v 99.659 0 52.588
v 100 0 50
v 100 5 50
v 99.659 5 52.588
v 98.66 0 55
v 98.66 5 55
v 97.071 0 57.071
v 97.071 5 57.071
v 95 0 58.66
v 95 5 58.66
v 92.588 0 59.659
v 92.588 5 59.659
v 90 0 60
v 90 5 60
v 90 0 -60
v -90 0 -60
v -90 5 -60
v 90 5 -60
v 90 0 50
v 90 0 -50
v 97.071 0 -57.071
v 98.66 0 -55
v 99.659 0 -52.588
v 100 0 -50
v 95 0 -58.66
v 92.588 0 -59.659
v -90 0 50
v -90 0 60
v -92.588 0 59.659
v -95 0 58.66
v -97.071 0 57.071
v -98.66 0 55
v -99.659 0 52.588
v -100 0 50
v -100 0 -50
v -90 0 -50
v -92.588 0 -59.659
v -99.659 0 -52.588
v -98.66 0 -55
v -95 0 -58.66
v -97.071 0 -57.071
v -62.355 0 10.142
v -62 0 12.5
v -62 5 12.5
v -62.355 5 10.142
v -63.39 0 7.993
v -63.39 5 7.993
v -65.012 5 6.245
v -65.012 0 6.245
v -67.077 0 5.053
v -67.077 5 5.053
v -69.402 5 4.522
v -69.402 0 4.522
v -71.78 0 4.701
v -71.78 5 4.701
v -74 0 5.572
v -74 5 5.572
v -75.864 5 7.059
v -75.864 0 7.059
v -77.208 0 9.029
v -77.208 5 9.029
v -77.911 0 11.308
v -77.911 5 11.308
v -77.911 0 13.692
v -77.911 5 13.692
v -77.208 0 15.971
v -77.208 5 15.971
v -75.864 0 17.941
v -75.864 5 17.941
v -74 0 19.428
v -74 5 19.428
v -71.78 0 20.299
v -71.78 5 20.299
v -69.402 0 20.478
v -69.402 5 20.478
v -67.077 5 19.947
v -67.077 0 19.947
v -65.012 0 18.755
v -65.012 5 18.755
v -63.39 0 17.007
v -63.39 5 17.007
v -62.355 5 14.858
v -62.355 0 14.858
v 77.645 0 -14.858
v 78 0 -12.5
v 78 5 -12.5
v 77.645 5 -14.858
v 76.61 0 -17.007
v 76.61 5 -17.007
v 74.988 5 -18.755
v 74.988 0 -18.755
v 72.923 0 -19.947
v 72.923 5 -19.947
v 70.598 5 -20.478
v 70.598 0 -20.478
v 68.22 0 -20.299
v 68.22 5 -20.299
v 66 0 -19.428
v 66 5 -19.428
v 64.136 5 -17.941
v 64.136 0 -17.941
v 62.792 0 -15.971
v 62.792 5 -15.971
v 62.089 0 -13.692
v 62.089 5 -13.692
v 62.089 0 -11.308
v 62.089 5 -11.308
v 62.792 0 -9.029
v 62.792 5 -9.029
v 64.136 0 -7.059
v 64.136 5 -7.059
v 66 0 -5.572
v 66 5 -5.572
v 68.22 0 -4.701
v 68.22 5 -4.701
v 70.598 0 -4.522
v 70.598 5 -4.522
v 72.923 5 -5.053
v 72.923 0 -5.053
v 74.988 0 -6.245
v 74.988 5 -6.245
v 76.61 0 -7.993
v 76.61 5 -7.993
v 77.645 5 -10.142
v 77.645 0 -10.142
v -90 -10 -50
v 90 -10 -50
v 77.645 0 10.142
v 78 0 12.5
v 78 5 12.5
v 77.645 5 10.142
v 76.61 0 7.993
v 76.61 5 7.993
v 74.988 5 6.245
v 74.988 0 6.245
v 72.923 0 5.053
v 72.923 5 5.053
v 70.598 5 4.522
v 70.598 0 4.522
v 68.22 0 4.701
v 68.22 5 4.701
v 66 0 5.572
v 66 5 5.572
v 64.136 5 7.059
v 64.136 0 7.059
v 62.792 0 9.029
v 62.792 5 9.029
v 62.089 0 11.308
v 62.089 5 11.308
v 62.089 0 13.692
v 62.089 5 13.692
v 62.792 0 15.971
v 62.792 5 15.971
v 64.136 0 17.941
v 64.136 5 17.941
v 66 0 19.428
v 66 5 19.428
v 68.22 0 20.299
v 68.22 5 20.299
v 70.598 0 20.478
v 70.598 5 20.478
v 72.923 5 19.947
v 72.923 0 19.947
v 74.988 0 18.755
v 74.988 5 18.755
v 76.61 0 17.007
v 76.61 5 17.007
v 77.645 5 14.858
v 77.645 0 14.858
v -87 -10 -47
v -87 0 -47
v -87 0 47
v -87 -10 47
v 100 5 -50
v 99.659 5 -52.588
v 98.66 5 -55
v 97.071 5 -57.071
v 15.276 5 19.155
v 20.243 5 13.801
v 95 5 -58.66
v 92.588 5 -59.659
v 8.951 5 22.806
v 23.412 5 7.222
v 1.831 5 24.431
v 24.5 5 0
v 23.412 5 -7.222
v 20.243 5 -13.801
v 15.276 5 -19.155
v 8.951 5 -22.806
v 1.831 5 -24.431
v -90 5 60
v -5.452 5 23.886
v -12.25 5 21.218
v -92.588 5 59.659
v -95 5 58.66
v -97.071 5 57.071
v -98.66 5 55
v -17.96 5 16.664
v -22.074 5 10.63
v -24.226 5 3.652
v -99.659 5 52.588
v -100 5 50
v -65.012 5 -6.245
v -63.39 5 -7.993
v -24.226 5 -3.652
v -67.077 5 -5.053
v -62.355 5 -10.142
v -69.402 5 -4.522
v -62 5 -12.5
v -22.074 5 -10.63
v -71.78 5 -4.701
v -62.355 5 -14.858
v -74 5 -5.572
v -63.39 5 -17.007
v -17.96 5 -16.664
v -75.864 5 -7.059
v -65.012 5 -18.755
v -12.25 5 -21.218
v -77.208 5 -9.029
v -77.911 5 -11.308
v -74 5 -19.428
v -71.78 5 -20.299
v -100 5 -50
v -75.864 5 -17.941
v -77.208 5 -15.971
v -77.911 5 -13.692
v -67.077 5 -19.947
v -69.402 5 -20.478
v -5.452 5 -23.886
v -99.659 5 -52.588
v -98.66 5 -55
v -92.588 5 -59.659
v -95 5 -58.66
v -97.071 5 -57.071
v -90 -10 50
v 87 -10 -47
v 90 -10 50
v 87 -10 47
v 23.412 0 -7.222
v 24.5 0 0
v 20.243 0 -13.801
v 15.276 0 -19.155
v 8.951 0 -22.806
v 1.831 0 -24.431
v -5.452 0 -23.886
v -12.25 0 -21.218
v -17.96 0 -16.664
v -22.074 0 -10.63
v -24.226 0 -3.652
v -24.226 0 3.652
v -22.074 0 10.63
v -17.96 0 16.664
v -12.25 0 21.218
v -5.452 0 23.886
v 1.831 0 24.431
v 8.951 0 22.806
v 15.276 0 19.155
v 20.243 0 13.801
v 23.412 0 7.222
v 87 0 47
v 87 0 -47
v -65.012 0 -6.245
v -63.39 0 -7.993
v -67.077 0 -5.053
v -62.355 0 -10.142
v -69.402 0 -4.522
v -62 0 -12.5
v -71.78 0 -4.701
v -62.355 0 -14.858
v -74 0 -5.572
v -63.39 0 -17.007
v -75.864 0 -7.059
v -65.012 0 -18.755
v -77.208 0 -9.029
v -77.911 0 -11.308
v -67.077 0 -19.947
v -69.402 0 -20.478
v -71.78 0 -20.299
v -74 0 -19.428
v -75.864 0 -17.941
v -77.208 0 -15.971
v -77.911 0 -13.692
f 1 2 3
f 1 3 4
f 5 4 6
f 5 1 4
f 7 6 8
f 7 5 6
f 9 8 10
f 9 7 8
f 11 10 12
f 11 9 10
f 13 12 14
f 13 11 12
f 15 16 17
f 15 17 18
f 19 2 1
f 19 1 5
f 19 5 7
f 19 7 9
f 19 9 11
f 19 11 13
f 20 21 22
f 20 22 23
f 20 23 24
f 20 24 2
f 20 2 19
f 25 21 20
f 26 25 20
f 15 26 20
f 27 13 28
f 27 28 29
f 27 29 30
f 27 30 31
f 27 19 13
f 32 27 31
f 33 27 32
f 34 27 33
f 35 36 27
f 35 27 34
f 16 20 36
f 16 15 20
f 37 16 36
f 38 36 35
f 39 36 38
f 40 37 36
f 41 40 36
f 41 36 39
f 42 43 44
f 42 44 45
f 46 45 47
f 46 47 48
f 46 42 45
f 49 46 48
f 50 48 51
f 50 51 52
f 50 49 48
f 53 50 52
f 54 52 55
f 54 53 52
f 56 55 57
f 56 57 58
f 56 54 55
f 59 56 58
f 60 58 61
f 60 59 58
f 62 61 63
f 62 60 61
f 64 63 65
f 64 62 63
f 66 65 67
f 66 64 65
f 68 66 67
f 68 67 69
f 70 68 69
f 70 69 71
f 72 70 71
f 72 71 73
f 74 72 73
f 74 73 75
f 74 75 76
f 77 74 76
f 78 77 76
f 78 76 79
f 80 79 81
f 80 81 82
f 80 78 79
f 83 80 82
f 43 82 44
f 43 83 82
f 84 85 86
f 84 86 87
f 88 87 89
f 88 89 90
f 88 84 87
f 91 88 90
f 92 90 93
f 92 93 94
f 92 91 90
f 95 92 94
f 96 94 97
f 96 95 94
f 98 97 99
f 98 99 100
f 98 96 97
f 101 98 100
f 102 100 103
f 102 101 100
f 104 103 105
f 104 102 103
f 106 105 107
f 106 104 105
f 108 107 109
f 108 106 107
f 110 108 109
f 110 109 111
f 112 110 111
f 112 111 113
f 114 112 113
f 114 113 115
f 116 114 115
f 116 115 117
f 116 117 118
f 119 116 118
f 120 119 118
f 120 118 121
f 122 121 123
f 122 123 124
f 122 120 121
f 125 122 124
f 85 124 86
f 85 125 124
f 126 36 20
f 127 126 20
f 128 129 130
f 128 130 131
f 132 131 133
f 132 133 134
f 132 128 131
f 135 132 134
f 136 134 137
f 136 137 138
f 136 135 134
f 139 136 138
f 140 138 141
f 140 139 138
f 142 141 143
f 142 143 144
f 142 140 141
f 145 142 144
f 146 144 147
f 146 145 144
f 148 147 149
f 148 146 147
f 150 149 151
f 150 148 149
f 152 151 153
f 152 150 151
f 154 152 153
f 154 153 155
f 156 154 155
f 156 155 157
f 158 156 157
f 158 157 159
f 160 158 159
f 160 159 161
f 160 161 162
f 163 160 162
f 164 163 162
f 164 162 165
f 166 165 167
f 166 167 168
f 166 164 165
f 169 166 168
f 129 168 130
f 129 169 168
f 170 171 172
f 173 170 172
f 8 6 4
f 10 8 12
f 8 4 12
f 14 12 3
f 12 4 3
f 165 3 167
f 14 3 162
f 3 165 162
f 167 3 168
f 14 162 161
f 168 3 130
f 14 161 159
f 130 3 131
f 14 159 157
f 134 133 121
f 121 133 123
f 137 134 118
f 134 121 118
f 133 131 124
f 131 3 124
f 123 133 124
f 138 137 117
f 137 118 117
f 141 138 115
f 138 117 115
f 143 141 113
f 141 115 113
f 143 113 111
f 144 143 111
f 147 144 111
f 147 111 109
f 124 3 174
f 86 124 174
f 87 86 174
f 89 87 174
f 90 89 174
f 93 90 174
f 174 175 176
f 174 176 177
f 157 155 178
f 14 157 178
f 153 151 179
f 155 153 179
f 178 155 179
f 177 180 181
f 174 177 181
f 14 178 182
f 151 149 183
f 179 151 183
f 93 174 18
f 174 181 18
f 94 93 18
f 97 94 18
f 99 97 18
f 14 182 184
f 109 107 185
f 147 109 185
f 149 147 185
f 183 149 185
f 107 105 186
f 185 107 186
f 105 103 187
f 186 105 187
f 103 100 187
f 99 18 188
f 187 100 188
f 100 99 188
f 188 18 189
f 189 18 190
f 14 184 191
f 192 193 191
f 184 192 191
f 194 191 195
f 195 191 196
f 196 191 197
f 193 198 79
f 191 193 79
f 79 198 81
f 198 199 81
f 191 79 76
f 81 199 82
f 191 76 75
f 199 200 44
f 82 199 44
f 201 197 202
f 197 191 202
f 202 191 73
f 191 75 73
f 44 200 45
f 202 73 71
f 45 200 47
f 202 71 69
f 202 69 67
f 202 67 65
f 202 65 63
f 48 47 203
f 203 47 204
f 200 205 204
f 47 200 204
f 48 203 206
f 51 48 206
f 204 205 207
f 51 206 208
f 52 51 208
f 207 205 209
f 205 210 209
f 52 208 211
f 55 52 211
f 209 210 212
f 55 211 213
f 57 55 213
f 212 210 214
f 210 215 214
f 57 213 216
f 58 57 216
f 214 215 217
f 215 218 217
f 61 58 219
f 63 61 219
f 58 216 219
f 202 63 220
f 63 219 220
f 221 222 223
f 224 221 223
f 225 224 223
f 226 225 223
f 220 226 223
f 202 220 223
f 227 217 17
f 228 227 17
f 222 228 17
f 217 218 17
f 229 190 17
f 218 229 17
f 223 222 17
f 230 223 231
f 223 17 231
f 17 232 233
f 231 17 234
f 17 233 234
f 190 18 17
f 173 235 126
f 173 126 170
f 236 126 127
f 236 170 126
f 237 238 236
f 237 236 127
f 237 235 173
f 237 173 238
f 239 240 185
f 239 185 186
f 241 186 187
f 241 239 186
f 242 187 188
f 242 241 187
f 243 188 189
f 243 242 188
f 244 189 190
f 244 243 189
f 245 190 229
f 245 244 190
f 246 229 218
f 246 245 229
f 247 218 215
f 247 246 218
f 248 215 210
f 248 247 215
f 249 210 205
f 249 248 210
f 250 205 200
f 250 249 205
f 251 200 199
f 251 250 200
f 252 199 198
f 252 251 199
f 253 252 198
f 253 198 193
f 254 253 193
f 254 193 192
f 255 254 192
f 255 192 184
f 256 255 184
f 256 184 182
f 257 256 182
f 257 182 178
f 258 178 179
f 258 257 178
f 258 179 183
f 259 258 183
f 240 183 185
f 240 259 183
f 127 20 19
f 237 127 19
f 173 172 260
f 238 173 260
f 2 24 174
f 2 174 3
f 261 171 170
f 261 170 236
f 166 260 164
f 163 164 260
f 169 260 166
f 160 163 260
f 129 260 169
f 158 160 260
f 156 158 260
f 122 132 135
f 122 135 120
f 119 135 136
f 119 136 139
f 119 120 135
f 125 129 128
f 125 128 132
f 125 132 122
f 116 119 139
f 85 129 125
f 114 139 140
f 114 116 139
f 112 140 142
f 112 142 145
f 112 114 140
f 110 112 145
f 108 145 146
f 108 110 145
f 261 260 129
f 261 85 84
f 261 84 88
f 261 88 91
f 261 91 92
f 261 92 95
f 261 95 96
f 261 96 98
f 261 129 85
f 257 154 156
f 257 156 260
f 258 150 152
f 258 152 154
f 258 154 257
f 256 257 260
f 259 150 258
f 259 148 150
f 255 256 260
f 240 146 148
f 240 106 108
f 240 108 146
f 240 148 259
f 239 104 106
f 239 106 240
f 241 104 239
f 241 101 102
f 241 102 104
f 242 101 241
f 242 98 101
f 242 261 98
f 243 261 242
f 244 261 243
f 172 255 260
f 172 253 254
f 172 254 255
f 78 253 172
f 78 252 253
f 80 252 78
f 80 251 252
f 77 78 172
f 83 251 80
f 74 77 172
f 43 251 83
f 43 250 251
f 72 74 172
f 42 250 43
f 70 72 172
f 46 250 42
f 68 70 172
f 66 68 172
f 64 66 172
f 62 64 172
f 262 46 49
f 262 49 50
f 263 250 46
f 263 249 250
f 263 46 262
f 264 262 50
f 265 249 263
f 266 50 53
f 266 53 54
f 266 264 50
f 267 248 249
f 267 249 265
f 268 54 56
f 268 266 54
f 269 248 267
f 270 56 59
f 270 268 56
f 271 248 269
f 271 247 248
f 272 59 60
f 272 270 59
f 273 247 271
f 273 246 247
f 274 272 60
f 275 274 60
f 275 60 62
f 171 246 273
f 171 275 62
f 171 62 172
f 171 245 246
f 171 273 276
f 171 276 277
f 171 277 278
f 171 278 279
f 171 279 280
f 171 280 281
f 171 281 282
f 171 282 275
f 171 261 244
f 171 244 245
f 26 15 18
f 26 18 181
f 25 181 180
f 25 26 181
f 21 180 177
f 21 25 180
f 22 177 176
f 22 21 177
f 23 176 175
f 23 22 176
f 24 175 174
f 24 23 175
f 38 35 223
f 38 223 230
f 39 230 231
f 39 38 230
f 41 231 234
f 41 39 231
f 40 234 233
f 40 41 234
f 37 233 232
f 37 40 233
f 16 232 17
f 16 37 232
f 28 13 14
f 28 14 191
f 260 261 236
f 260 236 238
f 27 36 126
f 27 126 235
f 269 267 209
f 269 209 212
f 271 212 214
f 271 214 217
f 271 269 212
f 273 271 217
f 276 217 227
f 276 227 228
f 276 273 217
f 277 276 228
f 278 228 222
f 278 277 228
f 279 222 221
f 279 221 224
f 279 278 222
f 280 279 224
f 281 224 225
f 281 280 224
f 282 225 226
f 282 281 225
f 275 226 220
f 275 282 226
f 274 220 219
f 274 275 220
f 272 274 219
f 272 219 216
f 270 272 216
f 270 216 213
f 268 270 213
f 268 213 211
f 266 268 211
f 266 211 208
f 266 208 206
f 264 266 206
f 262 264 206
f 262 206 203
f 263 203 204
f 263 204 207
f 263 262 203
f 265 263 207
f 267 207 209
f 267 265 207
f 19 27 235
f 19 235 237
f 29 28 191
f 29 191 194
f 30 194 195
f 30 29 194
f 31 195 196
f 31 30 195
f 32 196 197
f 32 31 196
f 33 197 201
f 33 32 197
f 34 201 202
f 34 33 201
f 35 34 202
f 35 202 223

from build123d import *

# Parameters (mm, degrees)
SKETCH1_R           = 24.5
SKETCH1_R_2         = 8
BOSS_EXTRUDE1_DEPTH = 5
SKETCH2_W           = 180
SKETCH2_H           = 100
SKETCH2_W_2         = 174
SKETCH2_H_2         = 94
BOSS_EXTRUDE2_DEPTH = 10


with BuildPart() as part:
    # Sketch1 → Boss-Extrude1 (new body)
    with BuildSketch(Plane(origin=(0, 0, 0), x_dir=(1, 0, 0), z_dir=(0, 1, 0))):
        with BuildLine():
            Line((-90, 60), (90, 60))
            ThreePointArc((90, 60), (97.071067812, 57.071067812), (100, 50))
            Line((100, 50), (100, -50))
            ThreePointArc((100, -50), (97.071067812, -57.071067812), (90, -60))
            Line((90, -60), (-90, -60))
            ThreePointArc((-90, -60), (-97.071067812, -57.071067812), (-100, -50))
            Line((-100, -50), (-100, 50))
            ThreePointArc((-100, 50), (-97.071067812, 57.071067812), (-90, 60))
        make_face()
        Circle(SKETCH1_R, mode=Mode.SUBTRACT)
        with Locations((-70, 12.5)):
            Circle(SKETCH1_R_2, mode=Mode.SUBTRACT)
        with Locations((-70, -12.5)):
            Circle(SKETCH1_R_2, mode=Mode.SUBTRACT)
        with Locations((70, 12.5)):
            Circle(SKETCH1_R_2, mode=Mode.SUBTRACT)
        with Locations((70, -12.5)):
            Circle(SKETCH1_R_2, mode=Mode.SUBTRACT)
    extrude(amount=BOSS_EXTRUDE1_DEPTH)

    # Sketch2 → Boss-Extrude2 (add)
    with BuildSketch(Plane.XZ):
        Rectangle(SKETCH2_W, SKETCH2_H)
        Rectangle(SKETCH2_W_2, SKETCH2_H_2, mode=Mode.SUBTRACT)
    extrude(amount=BOSS_EXTRUDE2_DEPTH)


solid = part.part
